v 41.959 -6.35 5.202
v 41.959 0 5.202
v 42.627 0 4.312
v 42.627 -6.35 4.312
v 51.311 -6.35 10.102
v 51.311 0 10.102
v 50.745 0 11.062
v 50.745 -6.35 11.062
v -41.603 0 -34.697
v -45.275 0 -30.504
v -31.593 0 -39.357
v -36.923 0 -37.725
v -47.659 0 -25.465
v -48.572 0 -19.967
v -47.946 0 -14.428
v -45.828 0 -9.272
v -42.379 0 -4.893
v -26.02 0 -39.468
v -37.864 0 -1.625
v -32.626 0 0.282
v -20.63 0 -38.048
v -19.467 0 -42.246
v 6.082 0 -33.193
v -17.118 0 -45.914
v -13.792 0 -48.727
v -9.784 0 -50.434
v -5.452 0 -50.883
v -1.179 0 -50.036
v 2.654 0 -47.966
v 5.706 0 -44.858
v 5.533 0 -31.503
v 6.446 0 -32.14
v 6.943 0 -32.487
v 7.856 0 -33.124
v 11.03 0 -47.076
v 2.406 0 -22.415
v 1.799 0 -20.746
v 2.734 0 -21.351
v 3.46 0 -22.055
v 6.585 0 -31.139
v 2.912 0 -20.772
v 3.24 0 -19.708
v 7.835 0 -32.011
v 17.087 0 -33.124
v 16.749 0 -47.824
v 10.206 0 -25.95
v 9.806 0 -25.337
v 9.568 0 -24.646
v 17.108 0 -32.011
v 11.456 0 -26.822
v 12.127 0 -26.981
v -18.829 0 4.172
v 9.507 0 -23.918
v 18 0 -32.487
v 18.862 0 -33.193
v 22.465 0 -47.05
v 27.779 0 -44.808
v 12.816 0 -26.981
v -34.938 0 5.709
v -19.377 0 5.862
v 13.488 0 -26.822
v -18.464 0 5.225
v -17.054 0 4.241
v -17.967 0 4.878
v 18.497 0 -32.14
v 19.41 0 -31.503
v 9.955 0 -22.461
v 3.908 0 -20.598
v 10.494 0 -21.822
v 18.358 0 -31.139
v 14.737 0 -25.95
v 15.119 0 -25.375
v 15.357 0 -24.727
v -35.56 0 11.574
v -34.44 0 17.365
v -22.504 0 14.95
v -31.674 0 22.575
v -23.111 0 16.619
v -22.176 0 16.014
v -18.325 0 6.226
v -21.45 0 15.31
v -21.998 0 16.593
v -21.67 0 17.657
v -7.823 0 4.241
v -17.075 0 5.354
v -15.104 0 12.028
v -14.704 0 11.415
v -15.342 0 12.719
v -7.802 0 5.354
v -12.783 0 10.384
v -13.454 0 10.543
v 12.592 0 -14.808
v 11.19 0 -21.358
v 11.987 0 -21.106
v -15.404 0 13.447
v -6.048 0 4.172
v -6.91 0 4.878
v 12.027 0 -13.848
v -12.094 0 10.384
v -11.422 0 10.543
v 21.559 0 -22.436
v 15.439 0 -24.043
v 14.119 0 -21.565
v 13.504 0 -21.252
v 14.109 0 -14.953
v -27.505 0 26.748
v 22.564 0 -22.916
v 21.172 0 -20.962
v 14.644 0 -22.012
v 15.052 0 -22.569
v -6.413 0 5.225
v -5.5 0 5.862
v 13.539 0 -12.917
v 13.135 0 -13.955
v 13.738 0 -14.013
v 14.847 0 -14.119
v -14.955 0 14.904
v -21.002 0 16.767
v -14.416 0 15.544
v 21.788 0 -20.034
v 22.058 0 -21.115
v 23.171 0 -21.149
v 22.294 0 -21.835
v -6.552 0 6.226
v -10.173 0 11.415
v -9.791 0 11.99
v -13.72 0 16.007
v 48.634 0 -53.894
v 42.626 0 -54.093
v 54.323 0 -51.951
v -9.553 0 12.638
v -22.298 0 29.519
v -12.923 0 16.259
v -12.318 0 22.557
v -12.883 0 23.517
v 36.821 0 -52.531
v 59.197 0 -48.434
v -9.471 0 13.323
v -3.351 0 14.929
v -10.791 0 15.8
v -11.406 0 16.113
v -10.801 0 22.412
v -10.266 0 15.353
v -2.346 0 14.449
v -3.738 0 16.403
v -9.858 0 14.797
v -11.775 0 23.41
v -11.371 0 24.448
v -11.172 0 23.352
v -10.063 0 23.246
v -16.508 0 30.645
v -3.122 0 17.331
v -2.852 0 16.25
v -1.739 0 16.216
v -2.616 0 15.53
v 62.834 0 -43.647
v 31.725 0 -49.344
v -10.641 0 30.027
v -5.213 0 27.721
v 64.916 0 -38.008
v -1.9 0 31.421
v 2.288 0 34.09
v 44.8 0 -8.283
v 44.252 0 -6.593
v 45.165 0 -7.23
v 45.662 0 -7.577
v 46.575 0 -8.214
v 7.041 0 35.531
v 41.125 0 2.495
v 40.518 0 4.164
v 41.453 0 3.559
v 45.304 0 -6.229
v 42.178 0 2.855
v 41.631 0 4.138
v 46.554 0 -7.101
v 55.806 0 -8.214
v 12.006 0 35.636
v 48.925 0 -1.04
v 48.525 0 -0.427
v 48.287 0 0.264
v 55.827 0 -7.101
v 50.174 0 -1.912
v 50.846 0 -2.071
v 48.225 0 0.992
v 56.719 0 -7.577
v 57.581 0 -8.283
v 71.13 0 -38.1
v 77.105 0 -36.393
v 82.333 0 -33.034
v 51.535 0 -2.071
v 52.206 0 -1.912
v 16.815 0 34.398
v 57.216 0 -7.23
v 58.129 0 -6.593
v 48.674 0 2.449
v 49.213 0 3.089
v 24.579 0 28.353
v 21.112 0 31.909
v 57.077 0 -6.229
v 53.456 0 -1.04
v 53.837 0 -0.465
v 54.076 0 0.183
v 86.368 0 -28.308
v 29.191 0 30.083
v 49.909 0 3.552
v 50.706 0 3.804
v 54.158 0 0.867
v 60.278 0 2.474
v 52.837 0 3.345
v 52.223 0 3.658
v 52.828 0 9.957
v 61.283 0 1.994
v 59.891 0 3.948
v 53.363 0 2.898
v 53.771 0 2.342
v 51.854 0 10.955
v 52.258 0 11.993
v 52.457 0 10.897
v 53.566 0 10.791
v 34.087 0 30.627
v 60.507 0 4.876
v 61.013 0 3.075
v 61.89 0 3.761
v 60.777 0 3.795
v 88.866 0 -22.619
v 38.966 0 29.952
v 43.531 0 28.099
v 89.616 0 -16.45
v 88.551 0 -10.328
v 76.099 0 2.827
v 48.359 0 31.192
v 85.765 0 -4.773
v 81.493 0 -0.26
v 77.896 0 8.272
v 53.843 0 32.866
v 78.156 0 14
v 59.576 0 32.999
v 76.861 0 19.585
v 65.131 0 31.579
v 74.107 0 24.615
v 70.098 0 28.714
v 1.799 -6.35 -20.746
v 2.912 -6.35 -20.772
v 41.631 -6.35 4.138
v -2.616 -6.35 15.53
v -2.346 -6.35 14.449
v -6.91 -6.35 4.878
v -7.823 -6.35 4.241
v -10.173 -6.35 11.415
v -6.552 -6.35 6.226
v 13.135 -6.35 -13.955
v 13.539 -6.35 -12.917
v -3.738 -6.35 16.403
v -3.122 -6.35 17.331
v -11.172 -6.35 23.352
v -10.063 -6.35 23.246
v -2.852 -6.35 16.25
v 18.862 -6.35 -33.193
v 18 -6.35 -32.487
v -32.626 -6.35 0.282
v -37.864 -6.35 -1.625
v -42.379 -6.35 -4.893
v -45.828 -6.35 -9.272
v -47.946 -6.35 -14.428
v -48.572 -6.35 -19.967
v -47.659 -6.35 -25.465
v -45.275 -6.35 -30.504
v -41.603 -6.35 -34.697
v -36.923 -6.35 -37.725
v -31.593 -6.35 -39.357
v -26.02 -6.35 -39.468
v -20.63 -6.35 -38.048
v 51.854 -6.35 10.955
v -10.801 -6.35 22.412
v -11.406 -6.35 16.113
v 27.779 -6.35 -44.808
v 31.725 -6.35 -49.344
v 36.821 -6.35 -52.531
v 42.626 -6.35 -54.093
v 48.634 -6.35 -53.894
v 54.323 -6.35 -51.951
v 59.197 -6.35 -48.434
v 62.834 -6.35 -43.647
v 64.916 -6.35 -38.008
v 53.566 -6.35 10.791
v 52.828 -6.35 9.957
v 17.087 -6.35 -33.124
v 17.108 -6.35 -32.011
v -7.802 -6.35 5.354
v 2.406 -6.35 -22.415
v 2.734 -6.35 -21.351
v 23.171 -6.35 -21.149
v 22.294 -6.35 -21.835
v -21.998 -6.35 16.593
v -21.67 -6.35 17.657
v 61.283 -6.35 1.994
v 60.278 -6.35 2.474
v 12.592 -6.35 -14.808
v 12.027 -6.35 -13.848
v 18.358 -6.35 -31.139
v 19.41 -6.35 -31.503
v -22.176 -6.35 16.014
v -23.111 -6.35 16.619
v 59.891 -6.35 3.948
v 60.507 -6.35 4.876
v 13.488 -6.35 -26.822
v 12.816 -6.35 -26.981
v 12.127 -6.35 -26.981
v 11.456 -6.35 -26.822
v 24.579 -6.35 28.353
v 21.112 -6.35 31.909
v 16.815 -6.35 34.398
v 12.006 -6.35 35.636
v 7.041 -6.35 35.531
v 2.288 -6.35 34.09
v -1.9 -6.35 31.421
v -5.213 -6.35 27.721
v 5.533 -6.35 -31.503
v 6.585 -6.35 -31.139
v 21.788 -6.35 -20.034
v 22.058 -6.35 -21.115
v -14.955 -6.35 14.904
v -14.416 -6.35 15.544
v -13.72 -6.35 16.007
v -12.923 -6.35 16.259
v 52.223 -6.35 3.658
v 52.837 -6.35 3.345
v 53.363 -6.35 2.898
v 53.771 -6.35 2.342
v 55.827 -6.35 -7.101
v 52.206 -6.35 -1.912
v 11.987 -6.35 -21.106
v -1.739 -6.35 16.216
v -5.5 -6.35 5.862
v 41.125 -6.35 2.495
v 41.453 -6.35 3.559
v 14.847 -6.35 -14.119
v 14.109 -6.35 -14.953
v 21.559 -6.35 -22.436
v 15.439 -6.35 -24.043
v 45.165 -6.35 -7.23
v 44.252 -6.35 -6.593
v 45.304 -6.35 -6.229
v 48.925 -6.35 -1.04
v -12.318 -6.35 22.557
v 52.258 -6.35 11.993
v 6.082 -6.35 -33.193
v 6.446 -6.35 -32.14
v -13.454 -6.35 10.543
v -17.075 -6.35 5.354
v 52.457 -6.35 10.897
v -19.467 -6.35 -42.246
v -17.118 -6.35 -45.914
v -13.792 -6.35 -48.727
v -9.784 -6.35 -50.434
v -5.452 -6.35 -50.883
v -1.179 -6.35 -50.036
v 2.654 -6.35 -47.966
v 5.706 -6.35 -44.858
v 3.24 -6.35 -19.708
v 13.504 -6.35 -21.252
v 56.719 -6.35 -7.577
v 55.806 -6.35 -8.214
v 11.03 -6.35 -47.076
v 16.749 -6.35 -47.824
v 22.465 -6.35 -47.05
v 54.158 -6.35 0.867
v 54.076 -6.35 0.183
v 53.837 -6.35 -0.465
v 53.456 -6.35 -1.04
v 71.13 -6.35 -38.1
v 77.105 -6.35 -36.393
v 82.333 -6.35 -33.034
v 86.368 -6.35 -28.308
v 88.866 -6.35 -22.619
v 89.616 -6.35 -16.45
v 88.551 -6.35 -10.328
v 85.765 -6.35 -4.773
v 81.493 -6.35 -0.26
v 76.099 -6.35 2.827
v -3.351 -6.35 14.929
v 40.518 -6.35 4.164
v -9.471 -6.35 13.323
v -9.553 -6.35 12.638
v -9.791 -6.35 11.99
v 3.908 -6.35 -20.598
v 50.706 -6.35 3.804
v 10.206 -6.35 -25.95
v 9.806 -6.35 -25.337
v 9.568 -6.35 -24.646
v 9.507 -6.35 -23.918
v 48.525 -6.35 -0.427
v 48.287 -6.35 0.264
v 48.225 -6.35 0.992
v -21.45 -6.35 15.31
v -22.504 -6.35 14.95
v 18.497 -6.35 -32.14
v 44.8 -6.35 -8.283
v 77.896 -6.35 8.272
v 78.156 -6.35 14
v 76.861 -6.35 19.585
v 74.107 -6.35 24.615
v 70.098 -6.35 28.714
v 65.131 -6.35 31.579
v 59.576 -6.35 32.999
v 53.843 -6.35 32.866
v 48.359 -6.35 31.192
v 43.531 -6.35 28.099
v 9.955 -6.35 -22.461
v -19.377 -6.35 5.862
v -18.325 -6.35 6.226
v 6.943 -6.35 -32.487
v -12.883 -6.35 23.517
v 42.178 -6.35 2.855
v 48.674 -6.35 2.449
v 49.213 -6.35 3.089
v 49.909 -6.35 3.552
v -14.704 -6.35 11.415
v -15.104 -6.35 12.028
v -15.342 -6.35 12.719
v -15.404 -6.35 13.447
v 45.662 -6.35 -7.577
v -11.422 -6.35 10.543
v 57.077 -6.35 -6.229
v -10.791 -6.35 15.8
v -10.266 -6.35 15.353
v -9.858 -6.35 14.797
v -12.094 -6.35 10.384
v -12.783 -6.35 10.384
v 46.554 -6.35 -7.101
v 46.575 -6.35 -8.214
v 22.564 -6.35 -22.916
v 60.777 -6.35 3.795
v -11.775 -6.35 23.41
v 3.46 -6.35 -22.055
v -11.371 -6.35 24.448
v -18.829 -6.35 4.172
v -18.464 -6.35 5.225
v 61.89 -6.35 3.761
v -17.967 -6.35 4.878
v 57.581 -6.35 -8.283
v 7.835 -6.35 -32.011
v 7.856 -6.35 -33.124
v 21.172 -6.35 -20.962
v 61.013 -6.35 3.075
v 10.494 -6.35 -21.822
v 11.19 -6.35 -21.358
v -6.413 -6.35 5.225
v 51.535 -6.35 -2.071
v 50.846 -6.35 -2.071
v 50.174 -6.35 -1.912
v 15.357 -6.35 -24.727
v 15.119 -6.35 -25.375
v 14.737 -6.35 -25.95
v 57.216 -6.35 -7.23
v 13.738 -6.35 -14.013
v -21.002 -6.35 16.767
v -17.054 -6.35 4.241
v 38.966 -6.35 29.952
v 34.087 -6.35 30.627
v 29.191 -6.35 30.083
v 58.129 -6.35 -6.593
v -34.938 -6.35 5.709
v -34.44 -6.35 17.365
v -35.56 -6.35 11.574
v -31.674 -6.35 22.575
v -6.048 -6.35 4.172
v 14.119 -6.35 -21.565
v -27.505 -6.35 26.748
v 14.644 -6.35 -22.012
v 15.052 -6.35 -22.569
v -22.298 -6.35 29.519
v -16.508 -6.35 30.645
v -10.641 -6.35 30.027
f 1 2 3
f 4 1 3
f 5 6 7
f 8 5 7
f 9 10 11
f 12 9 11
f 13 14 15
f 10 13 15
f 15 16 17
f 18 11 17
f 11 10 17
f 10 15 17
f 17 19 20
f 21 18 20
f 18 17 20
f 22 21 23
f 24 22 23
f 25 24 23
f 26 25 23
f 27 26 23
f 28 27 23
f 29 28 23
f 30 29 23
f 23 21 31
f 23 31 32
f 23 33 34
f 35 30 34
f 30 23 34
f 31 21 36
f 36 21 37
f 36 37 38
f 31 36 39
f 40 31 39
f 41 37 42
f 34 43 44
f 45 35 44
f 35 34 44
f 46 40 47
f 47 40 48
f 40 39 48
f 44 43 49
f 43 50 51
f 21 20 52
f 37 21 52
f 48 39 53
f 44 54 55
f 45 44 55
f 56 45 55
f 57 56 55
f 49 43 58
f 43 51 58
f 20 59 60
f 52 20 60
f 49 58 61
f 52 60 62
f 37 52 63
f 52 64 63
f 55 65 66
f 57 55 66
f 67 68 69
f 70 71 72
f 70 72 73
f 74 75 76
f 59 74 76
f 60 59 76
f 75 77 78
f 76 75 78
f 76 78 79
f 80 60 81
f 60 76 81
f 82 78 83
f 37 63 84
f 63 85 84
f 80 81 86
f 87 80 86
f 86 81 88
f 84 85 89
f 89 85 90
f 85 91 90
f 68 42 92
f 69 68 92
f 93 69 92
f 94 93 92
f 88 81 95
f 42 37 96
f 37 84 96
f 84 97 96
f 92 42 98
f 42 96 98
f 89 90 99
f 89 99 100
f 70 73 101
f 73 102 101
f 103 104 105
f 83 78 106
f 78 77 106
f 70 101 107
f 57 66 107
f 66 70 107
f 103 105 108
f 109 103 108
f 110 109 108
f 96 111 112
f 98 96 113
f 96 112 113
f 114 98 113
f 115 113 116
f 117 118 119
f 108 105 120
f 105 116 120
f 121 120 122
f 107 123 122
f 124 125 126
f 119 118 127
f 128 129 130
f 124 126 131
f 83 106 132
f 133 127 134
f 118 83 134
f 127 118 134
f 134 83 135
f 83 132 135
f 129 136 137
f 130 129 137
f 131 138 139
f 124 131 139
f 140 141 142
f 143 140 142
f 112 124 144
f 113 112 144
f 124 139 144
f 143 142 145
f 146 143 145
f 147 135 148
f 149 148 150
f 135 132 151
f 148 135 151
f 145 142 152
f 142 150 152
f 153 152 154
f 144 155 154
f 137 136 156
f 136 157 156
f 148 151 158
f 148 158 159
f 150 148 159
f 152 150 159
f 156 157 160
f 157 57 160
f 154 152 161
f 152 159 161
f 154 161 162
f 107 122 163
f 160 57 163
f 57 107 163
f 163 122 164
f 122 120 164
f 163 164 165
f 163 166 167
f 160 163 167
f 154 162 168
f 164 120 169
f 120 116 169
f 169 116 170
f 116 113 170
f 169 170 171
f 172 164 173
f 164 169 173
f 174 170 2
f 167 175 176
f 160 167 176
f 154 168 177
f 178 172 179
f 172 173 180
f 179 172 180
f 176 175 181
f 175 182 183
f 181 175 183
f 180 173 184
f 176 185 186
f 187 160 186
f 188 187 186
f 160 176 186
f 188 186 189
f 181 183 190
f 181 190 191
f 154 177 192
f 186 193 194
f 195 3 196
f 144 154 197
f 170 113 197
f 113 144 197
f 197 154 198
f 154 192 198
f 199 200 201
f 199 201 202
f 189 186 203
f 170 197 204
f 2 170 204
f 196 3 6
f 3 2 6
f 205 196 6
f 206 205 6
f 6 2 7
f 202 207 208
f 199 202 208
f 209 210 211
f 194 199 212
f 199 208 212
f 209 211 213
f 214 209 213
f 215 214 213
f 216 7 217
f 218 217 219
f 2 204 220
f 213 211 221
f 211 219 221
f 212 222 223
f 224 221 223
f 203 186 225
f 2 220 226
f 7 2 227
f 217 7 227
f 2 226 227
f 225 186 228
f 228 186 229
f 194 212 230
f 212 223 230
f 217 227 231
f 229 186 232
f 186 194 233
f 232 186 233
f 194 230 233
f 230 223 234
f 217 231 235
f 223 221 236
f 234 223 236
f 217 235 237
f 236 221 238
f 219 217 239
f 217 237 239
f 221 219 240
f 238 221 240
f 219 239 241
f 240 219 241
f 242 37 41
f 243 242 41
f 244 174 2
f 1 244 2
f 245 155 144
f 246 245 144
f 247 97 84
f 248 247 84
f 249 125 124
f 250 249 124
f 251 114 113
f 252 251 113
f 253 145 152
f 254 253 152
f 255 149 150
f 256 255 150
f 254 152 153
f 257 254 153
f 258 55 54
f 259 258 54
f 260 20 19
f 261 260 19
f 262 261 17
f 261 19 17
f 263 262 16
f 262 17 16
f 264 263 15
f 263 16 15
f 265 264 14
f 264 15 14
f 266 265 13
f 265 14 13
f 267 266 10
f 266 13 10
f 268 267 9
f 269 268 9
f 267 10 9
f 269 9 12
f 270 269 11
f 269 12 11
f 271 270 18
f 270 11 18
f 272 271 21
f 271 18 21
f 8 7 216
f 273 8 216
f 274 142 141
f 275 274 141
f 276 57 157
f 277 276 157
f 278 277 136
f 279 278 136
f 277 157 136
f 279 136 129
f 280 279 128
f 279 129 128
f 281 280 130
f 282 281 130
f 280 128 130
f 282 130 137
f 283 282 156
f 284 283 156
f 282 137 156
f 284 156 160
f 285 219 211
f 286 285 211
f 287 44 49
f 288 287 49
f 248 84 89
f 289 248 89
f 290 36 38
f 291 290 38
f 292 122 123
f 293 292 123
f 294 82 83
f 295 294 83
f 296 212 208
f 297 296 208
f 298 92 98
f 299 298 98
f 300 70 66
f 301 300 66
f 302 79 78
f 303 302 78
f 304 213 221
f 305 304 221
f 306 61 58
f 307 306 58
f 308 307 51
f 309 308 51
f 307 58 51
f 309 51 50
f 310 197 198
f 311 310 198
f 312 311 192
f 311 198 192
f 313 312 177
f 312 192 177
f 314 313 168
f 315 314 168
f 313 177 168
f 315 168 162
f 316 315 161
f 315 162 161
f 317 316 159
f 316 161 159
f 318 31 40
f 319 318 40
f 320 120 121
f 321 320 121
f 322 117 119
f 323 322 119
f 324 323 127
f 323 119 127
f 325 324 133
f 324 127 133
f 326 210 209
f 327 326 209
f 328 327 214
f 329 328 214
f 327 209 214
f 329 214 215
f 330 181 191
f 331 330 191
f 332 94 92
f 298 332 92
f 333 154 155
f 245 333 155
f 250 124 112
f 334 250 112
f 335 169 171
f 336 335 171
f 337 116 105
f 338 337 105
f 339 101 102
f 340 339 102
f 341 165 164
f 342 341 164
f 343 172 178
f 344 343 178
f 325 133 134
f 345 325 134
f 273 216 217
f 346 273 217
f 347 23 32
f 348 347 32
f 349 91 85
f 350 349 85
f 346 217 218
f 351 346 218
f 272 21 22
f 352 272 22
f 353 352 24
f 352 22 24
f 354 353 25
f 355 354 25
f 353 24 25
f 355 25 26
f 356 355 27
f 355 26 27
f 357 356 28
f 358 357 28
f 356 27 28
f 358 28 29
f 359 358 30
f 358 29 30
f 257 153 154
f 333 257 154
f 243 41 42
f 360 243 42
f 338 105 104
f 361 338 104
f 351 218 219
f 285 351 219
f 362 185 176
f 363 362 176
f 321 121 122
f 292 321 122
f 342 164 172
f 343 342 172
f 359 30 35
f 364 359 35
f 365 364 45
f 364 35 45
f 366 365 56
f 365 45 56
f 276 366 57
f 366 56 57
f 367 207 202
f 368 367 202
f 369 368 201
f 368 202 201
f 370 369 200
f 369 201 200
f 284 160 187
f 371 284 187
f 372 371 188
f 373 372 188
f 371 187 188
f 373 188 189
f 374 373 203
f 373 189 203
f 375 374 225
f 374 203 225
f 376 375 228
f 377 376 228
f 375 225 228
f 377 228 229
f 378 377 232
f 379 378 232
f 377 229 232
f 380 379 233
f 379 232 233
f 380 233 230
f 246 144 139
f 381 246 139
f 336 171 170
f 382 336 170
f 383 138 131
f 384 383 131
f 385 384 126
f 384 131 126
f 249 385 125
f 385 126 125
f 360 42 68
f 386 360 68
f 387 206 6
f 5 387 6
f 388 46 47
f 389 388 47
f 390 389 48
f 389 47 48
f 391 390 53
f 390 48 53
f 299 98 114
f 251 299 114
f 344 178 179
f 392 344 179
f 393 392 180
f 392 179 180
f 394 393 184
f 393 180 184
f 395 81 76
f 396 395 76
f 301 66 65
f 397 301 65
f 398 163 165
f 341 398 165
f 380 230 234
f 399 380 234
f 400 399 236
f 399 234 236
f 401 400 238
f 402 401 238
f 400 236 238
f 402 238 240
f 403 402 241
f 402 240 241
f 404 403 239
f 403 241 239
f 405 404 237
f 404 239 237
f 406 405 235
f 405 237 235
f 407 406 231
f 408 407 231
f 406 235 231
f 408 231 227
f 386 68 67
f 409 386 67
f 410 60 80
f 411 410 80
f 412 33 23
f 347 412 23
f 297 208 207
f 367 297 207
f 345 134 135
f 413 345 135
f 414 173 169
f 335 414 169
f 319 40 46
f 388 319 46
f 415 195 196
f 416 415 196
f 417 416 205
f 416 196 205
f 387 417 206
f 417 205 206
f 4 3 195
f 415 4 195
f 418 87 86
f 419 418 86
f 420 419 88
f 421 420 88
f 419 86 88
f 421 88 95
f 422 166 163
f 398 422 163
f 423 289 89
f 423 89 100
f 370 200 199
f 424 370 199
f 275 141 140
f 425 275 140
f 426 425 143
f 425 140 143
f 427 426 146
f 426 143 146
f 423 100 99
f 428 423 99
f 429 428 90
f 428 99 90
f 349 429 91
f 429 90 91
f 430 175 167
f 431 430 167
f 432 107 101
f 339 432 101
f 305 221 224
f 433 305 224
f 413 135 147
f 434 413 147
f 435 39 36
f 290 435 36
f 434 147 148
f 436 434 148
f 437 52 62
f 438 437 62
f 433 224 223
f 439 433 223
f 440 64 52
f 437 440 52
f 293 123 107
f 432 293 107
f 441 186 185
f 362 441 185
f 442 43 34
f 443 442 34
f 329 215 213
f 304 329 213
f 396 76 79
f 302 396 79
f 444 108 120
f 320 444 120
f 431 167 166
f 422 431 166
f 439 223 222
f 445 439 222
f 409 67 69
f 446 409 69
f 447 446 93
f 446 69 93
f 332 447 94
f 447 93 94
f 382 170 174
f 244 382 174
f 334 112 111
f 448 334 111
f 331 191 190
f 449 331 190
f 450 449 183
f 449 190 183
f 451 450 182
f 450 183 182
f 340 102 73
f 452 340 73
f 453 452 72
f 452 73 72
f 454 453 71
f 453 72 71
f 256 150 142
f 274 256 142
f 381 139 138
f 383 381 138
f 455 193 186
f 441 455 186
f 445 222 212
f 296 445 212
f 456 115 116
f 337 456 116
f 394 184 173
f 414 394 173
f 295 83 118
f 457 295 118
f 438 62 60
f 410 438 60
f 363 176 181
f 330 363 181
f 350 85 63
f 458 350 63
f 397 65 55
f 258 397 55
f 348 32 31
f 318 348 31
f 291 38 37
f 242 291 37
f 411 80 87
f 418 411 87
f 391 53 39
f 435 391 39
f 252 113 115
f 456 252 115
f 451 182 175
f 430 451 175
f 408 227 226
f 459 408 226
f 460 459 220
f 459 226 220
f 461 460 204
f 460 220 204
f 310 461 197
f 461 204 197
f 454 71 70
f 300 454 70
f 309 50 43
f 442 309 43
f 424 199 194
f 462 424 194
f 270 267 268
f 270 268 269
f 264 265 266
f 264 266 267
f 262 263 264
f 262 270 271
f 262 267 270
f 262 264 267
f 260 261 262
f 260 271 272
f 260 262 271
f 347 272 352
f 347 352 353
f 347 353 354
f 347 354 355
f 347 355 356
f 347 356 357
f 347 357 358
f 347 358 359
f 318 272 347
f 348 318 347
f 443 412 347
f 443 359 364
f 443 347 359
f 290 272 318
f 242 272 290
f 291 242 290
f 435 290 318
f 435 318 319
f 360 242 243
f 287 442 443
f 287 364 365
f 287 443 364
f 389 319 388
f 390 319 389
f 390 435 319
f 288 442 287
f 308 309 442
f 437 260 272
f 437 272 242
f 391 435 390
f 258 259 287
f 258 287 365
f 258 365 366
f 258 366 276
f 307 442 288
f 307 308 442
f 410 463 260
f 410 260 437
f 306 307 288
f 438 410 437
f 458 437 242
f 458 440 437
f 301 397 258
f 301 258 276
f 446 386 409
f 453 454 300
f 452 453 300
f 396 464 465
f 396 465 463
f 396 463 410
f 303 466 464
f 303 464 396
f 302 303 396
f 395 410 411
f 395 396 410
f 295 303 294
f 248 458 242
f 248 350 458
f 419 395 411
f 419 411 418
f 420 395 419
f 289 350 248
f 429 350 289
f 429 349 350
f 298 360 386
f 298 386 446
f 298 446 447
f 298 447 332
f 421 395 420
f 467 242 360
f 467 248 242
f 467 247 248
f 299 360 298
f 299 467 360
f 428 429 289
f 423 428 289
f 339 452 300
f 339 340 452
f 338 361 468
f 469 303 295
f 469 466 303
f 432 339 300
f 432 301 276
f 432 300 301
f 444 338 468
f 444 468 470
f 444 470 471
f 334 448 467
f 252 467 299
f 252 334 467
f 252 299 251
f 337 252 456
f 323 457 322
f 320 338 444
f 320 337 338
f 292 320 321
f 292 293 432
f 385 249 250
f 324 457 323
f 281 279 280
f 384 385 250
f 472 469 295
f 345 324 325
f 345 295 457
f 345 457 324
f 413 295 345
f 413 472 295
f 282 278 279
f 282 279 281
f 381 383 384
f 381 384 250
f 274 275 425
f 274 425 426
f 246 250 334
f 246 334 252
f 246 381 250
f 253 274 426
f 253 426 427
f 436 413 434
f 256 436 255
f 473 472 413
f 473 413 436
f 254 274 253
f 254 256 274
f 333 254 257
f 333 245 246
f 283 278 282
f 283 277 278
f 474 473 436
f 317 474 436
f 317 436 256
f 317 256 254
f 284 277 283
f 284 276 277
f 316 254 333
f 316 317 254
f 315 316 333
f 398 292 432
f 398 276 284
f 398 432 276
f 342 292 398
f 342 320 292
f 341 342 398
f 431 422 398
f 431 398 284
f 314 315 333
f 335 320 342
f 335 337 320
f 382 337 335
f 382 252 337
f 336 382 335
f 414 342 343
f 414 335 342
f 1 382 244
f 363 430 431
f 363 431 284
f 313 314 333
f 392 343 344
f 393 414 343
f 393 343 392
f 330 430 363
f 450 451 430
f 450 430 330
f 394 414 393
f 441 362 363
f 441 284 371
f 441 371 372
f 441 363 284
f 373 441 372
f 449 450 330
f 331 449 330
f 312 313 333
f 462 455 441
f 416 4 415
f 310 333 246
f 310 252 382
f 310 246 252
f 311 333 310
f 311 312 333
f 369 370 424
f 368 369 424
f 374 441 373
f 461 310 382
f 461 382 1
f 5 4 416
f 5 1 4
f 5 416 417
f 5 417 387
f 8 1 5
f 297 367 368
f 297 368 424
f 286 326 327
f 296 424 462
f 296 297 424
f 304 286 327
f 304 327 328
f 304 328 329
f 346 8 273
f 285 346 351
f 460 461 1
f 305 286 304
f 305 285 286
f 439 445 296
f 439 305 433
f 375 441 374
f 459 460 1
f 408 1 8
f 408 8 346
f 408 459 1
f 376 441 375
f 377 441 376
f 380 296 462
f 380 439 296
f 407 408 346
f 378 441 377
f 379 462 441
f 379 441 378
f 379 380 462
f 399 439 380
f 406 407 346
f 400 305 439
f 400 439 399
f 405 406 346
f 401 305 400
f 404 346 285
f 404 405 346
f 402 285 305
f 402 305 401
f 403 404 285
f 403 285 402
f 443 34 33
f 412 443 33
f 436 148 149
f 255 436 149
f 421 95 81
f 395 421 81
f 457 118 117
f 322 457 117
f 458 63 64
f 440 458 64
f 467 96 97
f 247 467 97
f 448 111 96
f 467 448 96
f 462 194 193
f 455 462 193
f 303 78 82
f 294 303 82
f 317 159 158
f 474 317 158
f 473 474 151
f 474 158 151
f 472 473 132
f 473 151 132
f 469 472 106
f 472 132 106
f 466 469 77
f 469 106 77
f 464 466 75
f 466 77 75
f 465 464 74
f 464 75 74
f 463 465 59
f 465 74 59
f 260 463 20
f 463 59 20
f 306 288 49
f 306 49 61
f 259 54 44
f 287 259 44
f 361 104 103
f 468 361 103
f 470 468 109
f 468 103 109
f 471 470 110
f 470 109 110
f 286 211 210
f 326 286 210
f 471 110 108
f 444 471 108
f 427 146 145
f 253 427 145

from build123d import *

# Parameters (mm, degrees)
F1_DEPTH = 6.35


# Not quite as in the source:
# - a length typed as a fraction of an inch, garbled in the dataset ("3 / 203.2 mm" for 3/8 in), is restored


with BuildPart() as f1:
    # F0 (on Front) → F1 (new body)
    with BuildSketch(Plane.XZ):
        with BuildLine():
            ThreePointArc((24.579061552, 28.3529026657), (9.5195561517, 35.7531570559), (-5.2125295141, 27.720839839))
            ThreePointArc((-5.2125295141, 27.720839839), (-29.7447728029, 24.816757347), (-32.6261176355, 0.281833099))
            ThreePointArc((-32.6261176355, 0.281833099), (-47.6586884842, -25.465181848), (-20.6299769397, -38.0483339671))
            ThreePointArc((-20.6299769397, -38.0483339671), (-9.7842016961, -50.4339494071), (5.705863164, -44.8579112888))
            ThreePointArc((5.705863164, -44.8579112888), (16.7493256027, -47.8238039479), (27.779373908, -44.8084074092))
            ThreePointArc((27.779373908, -44.8084074092), (48.6340616912, -53.8941801606), (64.9161967707, -38.0082950333))
            ThreePointArc((64.9161967707, -38.0082950333), (88.8664062791, -22.618688114), (76.0994801139, 2.8265105082))
            ThreePointArc((76.0994801139, 2.8265105082), (70.0975710942, 28.7139027136), (43.5306278663, 28.0994805429))
            ThreePointArc((43.5306278663, 28.0994805429), (34.0869435906, 30.6266295541), (24.579061552, 28.3529026657))
        make_face()
        with BuildLine():
            ThreePointArc((9.9552140403, -22.4611988481), (10.8253405255, -21.564938524), (11.9872140403, -21.1061873886))
            Line((11.9872140403, -21.1061873886), (12.5920123004, -14.8077944269))
            Line((12.5920123004, -14.8077944269), (12.0265549094, -13.8484140251))
            Line((12.0265549094, -13.8484140251), (13.1350774738, -13.9548590377))
            Line((13.1350774738, -13.9548590377), (13.5390697269, -12.9171003587))
            Line((13.5390697269, -12.9171003587), (13.7382008585, -14.0127734892))
            Line((13.7382008585, -14.0127734892), (14.8467234229, -14.1192185018))
            Line((14.8467234229, -14.1192185018), (14.1090343836, -14.9534652864))
            Line((14.1090343836, -14.9534652864), (13.5042361235, -21.2518582481))
            ThreePointArc((13.5042361235, -21.2518582481), (14.3943138922, -21.7735734557), (15.0519583946, -22.5685130135))
            Line((15.0519583946, -22.5685130135), (21.1719606568, -20.9619305704))
            Line((21.1719606568, -20.9619305704), (21.788173451, -20.0343344251))
            Line((21.788173451, -20.0343344251), (22.0579849941, -21.114776255))
            Line((22.0579849941, -21.114776255), (23.1710785379, -21.1490629746))
            Line((23.1710785379, -21.1490629746), (22.2940630935, -21.8353549873))
            Line((22.2940630935, -21.8353549873), (22.5638746366, -22.9157968171))
            Line((22.5638746366, -22.9157968171), (21.5589198477, -22.4359857202))
            Line((21.5589198477, -22.4359857202), (15.4389175856, -24.0425681633))
            ThreePointArc((15.4389175856, -24.0425681633), (15.2565271687, -25.0580281222), (14.7374718125, -25.9496596209))
            Line((14.7374718125, -25.9496596209), (18.3579193376, -31.1388690552))
            Line((18.3579193376, -31.1388690552), (19.4102498473, -31.5032188374))
            Line((19.4102498473, -31.5032188374), (18.4969454746, -32.1404200522))
            Line((18.4969454746, -32.1404200522), (18.8616543221, -33.1926261736))
            Line((18.8616543221, -33.1926261736), (18.0000377843, -32.487099982))
            Line((18.0000377843, -32.487099982), (17.0867334116, -33.1243011968))
            Line((17.0867334116, -33.1243011968), (17.1080536411, -32.0108849615))
            Line((17.1080536411, -32.0108849615), (13.487606116, -26.8216755271))
            ThreePointArc((13.487606116, -26.8216755271), (12.471606116, -27.0010332485), (11.455606116, -26.8216755271))
            Line((11.455606116, -26.8216755271), (7.835158591, -32.0108849615))
            Line((7.835158591, -32.0108849615), (7.8564698266, -33.124301369))
            Line((7.8564698266, -33.124301369), (6.9431654539, -32.4871001542))
            Line((6.9431654539, -32.4871001542), (6.0815366025, -33.1926113076))
            Line((6.0815366025, -33.1926113076), (6.4462638144, -32.1404115518))
            Line((6.4462638144, -32.1404115518), (5.5329594417, -31.5032103369))
            Line((5.5329594417, -31.5032103369), (6.5852928945, -31.1388690552))
            Line((6.5852928945, -31.1388690552), (10.2057404195, -25.9496596209))
            ThreePointArc((10.2057404195, -25.9496596209), (9.6657394654, -24.9991764128), (9.5065515642, -23.9176596209))
            Line((9.5065515642, -23.9176596209), (3.4595978764, -22.0548966372))
            Line((3.4595978764, -22.0548966372), (2.4058730089, -22.4152268431))
            Line((2.4058730089, -22.4152268431), (2.7337236859, -21.3509487369))
            Line((2.7337236859, -21.3509487369), (1.7987755438, -20.7459314434))
            Line((1.7987755438, -20.7459314434), (2.9121035894, -20.7719048279))
            Line((2.9121035894, -20.7719048279), (3.2399542664, -19.7076267216))
            Line((3.2399542664, -19.7076267216), (3.9082603526, -20.5984358645))
            Line((3.9082603526, -20.5984358645), (9.9552140403, -22.4611988481))
        make_face(mode=Mode.SUBTRACT)
        with BuildLine():
            ThreePointArc((-14.9548382666, 14.9038782153), (-14.0847117815, 15.8001385395), (-12.9228382666, 16.2588896749))
            Line((-12.9228382666, 16.2588896749), (-12.3180400065, 22.5572826366))
            Line((-12.3180400065, 22.5572826366), (-12.8834973975, 23.5166630384))
            Line((-12.8834973975, 23.5166630384), (-11.7749748332, 23.4102180258))
            Line((-11.7749748332, 23.4102180258), (-11.37098258, 24.4479767047))
            Line((-11.37098258, 24.4479767047), (-11.1718514484, 23.3523035743))
            Line((-11.1718514484, 23.3523035743), (-10.0633288841, 23.2458585617))
            Line((-10.0633288841, 23.2458585617), (-10.8010179234, 22.411611777))
            Line((-10.8010179234, 22.411611777), (-11.4058161835, 16.1132188153))
            ThreePointArc((-11.4058161835, 16.1132188153), (-10.5157384147, 15.5915036078), (-9.8580939123, 14.7965640499))
            Line((-9.8580939123, 14.7965640499), (-3.7380916502, 16.4031464931))
            Line((-3.7380916502, 16.4031464931), (-3.121878856, 17.3307426383))
            Line((-3.121878856, 17.3307426383), (-2.8520673129, 16.2503008085))
            Line((-2.8520673129, 16.2503008085), (-1.7389737691, 16.2160140888))
            Line((-1.7389737691, 16.2160140888), (-2.6159892135, 15.5297220761))
            Line((-2.6159892135, 15.5297220761), (-2.3461776704, 14.4492802463))
            Line((-2.3461776704, 14.4492802463), (-3.3511324592, 14.9290913433))
            Line((-3.3511324592, 14.9290913433), (-9.4711347214, 13.3225089001))
            ThreePointArc((-9.4711347214, 13.3225089001), (-9.6535251382, 12.3070489413), (-10.1725804944, 11.4154174426))
            Line((-10.1725804944, 11.4154174426), (-6.5521329694, 6.2262080082))
            Line((-6.5521329694, 6.2262080082), (-5.4998024597, 5.8618582261))
            Line((-5.4998024597, 5.8618582261), (-6.4131068324, 5.2246570112))
            Line((-6.4131068324, 5.2246570112), (-6.0483979848, 4.1724508898))
            Line((-6.0483979848, 4.1724508898), (-6.9100145227, 4.8779770815))
            Line((-6.9100145227, 4.8779770815), (-7.8233188953, 4.2407758666))
            Line((-7.8233188953, 4.2407758666), (-7.8019986659, 5.354192102))
            Line((-7.8019986659, 5.354192102), (-11.4224461909, 10.5434015363))
            ThreePointArc((-11.4224461909, 10.5434015363), (-12.4384461909, 10.3640438149), (-13.4544461909, 10.5434015363))
            Line((-13.4544461909, 10.5434015363), (-17.0748937159, 5.354192102))
            Line((-17.0748937159, 5.354192102), (-17.0535824803, 4.2407756944))
            Line((-17.0535824803, 4.2407756944), (-17.966886853, 4.8779769093))
            Line((-17.966886853, 4.8779769093), (-18.8285157045, 4.1724657558))
            Line((-18.8285157045, 4.1724657558), (-18.4637884925, 5.2246655117))
            Line((-18.4637884925, 5.2246655117), (-19.3770928652, 5.8618667265))
            Line((-19.3770928652, 5.8618667265), (-18.3247594124, 6.2262080082))
            Line((-18.3247594124, 6.2262080082), (-14.7043118874, 11.4154174426))
            ThreePointArc((-14.7043118874, 11.4154174426), (-15.2443128415, 12.3659006506), (-15.4035007427, 13.4474174426))
            Line((-15.4035007427, 13.4474174426), (-21.4504544305, 15.3101804262))
            Line((-21.4504544305, 15.3101804262), (-22.5041792981, 14.9498502204))
            Line((-22.5041792981, 14.9498502204), (-22.176328621, 16.0141283266))
            Line((-22.176328621, 16.0141283266), (-23.1112767632, 16.61914562))
            Line((-23.1112767632, 16.61914562), (-21.9979487176, 16.5931722356))
            Line((-21.9979487176, 16.5931722356), (-21.6700980405, 17.6574503418))
            Line((-21.6700980405, 17.6574503418), (-21.0017919544, 16.7666411989))
            Line((-21.0017919544, 16.7666411989), (-14.9548382666, 14.9038782153))
        make_face(mode=Mode.SUBTRACT)
        with BuildLine():
            ThreePointArc((48.6740988512, 2.4488521783), (49.5442253363, 3.3451125024), (50.7060988512, 3.8038636378))
            Line((50.7060988512, 3.8038636378), (51.3108971112, 10.1022565995))
            Line((51.3108971112, 10.1022565995), (50.7454397202, 11.0616370013))
            Line((50.7454397202, 11.0616370013), (51.8539622846, 10.9551919887))
            Line((51.8539622846, 10.9551919887), (52.2579545378, 11.9929506677))
            Line((52.2579545378, 11.9929506677), (52.4570856693, 10.8972775372))
            Line((52.4570856693, 10.8972775372), (53.5656082337, 10.7908325246))
            Line((53.5656082337, 10.7908325246), (52.8279191944, 9.95658574))
            Line((52.8279191944, 9.95658574), (52.2231209343, 3.6581927783))
            ThreePointArc((52.2231209343, 3.6581927783), (53.113198703, 3.1364775707), (53.7708432054, 2.3415380128))
            Line((53.7708432054, 2.3415380128), (59.8908454676, 3.948120456))
            Line((59.8908454676, 3.948120456), (60.5070582618, 4.8757166012))
            Line((60.5070582618, 4.8757166012), (60.7768698049, 3.7952747714))
            Line((60.7768698049, 3.7952747714), (61.8899633487, 3.7609880518))
            Line((61.8899633487, 3.7609880518), (61.0129479043, 3.0746960391))
            Line((61.0129479043, 3.0746960391), (61.2827594474, 1.9942542093))
            Line((61.2827594474, 1.9942542093), (60.2778046585, 2.4740653062))
            Line((60.2778046585, 2.4740653062), (54.1578023964, 0.8674828631))
            ThreePointArc((54.1578023964, 0.8674828631), (53.9754119795, -0.1479770958), (53.4563566233, -1.0396085945))
            Line((53.4563566233, -1.0396085945), (57.0768041484, -6.2288180289))
            Line((57.0768041484, -6.2288180289), (58.1291346581, -6.593167811))
            Line((58.1291346581, -6.593167811), (57.2158302854, -7.2303690258))
            Line((57.2158302854, -7.2303690258), (57.5805391329, -8.2825751472))
            Line((57.5805391329, -8.2825751472), (56.7189225951, -7.5770489556))
            Line((56.7189225951, -7.5770489556), (55.8056182224, -8.2142501704))
            Line((55.8056182224, -8.2142501704), (55.8269384519, -7.1008339351))
            Line((55.8269384519, -7.1008339351), (52.2064909269, -1.9116245007))
            ThreePointArc((52.2064909269, -1.9116245007), (51.1904909269, -2.0909822221), (50.1744909269, -1.9116245007))
            Line((50.1744909269, -1.9116245007), (46.5540434018, -7.1008339351))
            Line((46.5540434018, -7.1008339351), (46.5753546374, -8.2142503426))
            Line((46.5753546374, -8.2142503426), (45.6620502647, -7.5770491278))
            Line((45.6620502647, -7.5770491278), (44.8004214133, -8.2825602812))
            Line((44.8004214133, -8.2825602812), (45.1651486252, -7.2303605254))
            Line((45.1651486252, -7.2303605254), (44.2518442526, -6.5931593106))
            Line((44.2518442526, -6.5931593106), (45.3041777053, -6.2288180289))
            Line((45.3041777053, -6.2288180289), (48.9246252304, -1.0396085945))
            ThreePointArc((48.9246252304, -1.0396085945), (48.3846242762, -0.0891253865), (48.225436375, 0.9923914055))
            Line((48.225436375, 0.9923914055), (42.1784826873, 2.8551543891))
            Line((42.1784826873, 2.8551543891), (41.1247578197, 2.4948241833))
            Line((41.1247578197, 2.4948241833), (41.4526084967, 3.5591022895))
            Line((41.4526084967, 3.5591022895), (40.5176603546, 4.164119583))
            Line((40.5176603546, 4.164119583), (41.6309884002, 4.1381461985))
            Line((41.6309884002, 4.1381461985), (41.9588390772, 5.2024243047))
            Line((41.9588390772, 5.2024243047), (42.6271451634, 4.3116151619))
            Line((42.6271451634, 4.3116151619), (48.6740988512, 2.4488521783))
        make_face(mode=Mode.SUBTRACT)
    extrude(amount=F1_DEPTH)


solid = f1.part
